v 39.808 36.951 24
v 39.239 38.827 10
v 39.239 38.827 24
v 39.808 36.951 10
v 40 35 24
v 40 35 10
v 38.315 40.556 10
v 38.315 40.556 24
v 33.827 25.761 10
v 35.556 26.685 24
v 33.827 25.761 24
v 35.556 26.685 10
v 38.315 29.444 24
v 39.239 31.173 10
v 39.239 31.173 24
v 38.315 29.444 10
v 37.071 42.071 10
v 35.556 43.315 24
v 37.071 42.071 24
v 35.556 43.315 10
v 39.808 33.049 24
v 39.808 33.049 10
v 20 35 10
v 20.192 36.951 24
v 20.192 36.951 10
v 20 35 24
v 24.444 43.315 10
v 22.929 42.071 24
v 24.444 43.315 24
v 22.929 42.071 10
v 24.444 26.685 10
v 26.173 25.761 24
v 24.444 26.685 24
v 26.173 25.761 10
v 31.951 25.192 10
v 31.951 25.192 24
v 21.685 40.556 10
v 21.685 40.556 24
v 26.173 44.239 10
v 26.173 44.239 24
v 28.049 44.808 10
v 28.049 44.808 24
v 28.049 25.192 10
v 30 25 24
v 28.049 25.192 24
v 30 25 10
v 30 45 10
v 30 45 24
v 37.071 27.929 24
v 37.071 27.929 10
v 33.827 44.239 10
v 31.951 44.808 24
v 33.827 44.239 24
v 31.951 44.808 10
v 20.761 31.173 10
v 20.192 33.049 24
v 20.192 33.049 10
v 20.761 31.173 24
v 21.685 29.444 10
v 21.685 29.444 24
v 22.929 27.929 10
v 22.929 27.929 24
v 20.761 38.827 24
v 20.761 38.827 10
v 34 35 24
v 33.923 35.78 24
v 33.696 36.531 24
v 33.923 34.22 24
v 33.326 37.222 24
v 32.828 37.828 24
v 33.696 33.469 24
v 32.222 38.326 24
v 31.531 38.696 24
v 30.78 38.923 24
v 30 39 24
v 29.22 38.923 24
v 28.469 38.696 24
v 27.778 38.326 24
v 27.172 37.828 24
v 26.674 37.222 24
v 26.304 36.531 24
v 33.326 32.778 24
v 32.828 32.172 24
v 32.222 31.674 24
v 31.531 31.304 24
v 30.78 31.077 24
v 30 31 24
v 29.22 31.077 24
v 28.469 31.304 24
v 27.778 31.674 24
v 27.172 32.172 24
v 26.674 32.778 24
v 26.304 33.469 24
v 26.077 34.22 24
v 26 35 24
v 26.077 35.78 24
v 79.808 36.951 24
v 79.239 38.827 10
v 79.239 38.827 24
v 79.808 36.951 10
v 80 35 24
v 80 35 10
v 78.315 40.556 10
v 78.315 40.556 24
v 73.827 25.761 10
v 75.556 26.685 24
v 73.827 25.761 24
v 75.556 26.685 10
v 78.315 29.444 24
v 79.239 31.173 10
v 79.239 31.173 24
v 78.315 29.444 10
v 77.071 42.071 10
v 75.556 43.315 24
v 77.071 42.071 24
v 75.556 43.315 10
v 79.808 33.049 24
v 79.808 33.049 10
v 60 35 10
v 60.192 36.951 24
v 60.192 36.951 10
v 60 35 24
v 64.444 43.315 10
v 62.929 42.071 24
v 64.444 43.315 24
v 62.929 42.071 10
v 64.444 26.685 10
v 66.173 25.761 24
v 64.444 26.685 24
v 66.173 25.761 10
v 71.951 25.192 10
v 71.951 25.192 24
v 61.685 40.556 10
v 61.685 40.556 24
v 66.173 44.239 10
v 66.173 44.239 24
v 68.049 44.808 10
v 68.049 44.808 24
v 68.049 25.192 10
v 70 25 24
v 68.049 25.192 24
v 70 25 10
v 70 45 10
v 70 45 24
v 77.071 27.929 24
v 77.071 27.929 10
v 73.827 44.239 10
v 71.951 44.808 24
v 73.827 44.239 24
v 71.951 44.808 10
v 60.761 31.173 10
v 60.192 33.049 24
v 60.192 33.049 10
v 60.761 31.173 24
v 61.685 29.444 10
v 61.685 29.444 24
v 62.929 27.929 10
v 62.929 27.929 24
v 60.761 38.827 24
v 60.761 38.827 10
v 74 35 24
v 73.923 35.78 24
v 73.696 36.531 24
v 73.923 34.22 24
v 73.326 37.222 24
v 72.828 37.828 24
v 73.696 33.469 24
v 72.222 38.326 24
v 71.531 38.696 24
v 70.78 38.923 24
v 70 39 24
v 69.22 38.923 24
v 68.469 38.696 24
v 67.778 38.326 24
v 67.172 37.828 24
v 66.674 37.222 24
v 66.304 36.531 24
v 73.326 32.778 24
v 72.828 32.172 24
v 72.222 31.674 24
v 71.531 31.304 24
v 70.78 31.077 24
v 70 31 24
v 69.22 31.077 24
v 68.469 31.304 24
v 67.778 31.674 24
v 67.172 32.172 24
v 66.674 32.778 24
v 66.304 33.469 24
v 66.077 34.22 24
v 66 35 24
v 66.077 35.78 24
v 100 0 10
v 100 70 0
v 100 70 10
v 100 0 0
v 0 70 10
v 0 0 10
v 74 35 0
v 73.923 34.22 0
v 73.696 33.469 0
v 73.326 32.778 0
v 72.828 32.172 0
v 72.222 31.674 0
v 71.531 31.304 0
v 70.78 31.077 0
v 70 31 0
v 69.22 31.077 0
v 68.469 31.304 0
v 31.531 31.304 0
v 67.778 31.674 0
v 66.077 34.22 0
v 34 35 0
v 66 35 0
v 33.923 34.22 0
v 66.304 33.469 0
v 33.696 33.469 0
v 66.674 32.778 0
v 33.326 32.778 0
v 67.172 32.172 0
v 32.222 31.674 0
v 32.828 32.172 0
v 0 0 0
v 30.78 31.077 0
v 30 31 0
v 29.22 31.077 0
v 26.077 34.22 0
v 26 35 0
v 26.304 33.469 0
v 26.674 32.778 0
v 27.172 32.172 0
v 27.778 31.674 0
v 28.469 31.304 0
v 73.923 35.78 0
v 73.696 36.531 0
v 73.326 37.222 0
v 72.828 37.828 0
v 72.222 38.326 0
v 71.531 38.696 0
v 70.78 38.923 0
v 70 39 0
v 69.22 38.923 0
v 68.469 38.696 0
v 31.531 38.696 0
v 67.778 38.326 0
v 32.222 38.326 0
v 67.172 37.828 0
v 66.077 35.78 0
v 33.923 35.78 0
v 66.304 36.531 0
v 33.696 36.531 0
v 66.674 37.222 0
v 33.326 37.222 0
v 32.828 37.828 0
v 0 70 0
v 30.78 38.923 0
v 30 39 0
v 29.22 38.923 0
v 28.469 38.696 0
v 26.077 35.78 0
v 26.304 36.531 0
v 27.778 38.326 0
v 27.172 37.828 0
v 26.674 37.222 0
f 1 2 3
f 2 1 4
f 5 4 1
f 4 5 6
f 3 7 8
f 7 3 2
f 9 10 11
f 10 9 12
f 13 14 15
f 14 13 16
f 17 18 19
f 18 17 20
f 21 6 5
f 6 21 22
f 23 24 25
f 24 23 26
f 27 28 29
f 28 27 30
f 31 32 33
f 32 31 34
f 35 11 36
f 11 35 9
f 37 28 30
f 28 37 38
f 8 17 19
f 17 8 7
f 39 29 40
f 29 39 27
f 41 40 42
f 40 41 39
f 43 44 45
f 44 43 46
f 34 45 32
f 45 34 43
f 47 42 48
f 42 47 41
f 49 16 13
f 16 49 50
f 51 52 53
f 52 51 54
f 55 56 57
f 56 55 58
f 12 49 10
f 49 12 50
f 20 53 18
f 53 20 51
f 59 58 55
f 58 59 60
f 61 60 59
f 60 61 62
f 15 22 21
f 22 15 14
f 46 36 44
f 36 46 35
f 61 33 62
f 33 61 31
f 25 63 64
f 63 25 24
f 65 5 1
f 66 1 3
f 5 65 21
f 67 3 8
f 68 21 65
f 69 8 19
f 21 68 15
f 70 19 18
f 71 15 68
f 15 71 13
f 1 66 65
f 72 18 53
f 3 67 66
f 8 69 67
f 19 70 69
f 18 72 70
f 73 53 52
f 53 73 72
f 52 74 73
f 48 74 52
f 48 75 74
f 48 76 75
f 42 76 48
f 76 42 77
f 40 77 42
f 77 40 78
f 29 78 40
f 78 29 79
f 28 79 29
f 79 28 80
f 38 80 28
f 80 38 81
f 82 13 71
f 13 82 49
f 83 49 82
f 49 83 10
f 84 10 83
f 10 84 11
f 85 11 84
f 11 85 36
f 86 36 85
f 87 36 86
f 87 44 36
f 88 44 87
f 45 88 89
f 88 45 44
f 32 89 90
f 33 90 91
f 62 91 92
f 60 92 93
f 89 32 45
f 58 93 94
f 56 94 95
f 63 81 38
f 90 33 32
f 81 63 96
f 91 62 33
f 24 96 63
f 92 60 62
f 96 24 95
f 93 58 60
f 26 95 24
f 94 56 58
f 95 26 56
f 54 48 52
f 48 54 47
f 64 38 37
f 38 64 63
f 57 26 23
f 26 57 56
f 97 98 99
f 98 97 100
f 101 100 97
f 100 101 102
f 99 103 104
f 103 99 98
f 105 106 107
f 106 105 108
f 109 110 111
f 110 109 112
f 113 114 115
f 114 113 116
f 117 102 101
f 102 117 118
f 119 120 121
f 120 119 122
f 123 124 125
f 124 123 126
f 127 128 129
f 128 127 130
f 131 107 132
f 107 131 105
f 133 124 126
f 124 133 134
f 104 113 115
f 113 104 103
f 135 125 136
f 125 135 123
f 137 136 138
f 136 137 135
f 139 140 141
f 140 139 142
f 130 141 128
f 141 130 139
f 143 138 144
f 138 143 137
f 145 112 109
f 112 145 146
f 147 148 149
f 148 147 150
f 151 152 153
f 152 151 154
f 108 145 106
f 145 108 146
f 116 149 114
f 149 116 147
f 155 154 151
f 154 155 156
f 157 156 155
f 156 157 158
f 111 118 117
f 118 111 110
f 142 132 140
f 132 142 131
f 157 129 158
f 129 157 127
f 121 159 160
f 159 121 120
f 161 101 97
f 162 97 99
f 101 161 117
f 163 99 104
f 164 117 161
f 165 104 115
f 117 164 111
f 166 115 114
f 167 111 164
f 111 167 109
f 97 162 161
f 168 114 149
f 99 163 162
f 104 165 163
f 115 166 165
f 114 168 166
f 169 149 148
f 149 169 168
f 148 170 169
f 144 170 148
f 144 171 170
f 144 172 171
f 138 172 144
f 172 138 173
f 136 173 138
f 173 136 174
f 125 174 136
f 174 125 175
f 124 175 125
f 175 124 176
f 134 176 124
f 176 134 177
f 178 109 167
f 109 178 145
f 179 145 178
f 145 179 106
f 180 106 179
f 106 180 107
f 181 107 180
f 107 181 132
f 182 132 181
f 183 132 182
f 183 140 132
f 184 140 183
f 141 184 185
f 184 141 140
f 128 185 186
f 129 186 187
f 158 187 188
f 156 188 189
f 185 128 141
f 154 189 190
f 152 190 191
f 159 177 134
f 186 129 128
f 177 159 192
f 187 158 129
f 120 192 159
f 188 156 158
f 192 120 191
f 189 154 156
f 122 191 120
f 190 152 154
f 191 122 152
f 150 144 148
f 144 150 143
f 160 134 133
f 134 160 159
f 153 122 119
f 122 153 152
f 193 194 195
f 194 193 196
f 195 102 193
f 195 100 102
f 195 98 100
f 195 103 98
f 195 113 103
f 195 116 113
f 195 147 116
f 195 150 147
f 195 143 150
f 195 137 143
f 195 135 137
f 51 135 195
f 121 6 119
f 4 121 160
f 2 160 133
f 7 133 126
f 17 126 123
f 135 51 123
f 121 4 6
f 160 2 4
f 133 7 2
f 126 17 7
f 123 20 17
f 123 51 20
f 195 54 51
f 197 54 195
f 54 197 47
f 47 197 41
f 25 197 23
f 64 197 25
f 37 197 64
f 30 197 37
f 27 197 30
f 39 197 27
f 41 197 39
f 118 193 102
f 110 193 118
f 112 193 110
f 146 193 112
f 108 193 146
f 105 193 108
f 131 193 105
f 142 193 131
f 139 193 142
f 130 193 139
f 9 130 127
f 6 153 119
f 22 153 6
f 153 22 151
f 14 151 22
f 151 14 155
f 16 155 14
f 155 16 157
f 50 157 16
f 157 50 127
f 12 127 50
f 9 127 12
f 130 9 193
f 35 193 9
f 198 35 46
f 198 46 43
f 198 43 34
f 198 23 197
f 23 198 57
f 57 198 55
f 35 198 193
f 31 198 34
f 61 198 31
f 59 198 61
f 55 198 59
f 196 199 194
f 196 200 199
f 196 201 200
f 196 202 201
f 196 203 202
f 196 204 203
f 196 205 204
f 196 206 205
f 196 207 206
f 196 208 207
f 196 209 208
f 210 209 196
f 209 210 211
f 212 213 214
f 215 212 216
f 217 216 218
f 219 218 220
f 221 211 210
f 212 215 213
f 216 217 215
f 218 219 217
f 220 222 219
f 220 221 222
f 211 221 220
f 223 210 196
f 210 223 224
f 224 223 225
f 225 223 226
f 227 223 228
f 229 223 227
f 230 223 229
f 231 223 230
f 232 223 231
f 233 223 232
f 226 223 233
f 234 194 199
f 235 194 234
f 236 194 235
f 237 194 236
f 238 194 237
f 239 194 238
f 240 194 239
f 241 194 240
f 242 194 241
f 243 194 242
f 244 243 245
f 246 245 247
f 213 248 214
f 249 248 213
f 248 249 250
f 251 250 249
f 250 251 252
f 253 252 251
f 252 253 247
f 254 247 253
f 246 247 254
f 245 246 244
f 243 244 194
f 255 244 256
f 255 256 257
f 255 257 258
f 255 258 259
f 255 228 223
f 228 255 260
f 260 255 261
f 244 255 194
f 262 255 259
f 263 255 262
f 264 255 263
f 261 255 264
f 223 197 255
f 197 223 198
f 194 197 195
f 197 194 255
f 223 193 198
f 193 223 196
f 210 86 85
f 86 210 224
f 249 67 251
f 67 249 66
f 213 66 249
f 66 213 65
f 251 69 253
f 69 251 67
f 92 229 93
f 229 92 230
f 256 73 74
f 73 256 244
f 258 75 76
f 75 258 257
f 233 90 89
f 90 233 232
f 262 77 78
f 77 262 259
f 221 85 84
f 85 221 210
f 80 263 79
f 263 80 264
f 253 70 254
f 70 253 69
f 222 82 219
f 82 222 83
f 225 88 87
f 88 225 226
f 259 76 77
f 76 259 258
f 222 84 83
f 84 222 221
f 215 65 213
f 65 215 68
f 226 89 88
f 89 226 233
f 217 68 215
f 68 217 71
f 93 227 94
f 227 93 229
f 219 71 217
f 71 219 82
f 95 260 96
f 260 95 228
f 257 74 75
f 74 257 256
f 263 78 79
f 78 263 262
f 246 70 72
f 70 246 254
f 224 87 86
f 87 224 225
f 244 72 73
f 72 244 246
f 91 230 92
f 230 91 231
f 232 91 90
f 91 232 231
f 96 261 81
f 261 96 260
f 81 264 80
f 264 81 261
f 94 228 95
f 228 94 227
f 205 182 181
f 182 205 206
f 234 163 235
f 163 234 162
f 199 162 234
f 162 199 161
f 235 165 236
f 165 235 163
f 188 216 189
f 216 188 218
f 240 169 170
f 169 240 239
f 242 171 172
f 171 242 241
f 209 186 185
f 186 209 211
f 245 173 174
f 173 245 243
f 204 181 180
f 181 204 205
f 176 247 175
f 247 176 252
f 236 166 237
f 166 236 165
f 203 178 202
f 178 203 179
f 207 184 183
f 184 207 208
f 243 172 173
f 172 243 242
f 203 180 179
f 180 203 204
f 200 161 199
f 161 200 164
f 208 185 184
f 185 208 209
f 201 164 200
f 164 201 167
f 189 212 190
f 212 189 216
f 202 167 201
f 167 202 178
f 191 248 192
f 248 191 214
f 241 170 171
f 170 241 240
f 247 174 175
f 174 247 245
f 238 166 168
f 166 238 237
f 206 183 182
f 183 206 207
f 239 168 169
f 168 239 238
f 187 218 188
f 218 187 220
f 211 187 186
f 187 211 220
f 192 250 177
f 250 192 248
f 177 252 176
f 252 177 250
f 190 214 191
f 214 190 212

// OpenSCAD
$fn = 32;

// ----------------------------------------------------------------------
// Drill jig: two_boss jig
// ----------------------------------------------------------------------

// --- parameters (mm) ---
plate_l = 100;            // plate length, X
plate_w = 70;             // plate width, Y
plate_t = 10;             // plate thickness
boss_d = 20;              // guide boss diameter
boss_h = 15;              // boss height above the plate
guide_d = 8;              // guide hole diameter
boss_pitch = 40;          // boss pitch

n_boss = 2;  // guide bosses
boss_x0 = (plate_l - (n_boss - 1) * boss_pitch) / 2;  // first boss X
boss_top = plate_t - 1 + boss_h;  // boss crown height
total_h = boss_top;  // overall height

difference() {
  union() {
  cube([plate_l, plate_w, plate_t]);
  for (i = [0 : n_boss - 1])
    translate([boss_x0 + i * boss_pitch, plate_w / 2, plate_t - 1])
      cylinder(h = boss_h, d = boss_d);
  }
  for (i = [0 : n_boss - 1])
    translate([boss_x0 + i * boss_pitch, plate_w / 2, -1])
      cylinder(h = plate_t + boss_h, d = guide_d);
}
